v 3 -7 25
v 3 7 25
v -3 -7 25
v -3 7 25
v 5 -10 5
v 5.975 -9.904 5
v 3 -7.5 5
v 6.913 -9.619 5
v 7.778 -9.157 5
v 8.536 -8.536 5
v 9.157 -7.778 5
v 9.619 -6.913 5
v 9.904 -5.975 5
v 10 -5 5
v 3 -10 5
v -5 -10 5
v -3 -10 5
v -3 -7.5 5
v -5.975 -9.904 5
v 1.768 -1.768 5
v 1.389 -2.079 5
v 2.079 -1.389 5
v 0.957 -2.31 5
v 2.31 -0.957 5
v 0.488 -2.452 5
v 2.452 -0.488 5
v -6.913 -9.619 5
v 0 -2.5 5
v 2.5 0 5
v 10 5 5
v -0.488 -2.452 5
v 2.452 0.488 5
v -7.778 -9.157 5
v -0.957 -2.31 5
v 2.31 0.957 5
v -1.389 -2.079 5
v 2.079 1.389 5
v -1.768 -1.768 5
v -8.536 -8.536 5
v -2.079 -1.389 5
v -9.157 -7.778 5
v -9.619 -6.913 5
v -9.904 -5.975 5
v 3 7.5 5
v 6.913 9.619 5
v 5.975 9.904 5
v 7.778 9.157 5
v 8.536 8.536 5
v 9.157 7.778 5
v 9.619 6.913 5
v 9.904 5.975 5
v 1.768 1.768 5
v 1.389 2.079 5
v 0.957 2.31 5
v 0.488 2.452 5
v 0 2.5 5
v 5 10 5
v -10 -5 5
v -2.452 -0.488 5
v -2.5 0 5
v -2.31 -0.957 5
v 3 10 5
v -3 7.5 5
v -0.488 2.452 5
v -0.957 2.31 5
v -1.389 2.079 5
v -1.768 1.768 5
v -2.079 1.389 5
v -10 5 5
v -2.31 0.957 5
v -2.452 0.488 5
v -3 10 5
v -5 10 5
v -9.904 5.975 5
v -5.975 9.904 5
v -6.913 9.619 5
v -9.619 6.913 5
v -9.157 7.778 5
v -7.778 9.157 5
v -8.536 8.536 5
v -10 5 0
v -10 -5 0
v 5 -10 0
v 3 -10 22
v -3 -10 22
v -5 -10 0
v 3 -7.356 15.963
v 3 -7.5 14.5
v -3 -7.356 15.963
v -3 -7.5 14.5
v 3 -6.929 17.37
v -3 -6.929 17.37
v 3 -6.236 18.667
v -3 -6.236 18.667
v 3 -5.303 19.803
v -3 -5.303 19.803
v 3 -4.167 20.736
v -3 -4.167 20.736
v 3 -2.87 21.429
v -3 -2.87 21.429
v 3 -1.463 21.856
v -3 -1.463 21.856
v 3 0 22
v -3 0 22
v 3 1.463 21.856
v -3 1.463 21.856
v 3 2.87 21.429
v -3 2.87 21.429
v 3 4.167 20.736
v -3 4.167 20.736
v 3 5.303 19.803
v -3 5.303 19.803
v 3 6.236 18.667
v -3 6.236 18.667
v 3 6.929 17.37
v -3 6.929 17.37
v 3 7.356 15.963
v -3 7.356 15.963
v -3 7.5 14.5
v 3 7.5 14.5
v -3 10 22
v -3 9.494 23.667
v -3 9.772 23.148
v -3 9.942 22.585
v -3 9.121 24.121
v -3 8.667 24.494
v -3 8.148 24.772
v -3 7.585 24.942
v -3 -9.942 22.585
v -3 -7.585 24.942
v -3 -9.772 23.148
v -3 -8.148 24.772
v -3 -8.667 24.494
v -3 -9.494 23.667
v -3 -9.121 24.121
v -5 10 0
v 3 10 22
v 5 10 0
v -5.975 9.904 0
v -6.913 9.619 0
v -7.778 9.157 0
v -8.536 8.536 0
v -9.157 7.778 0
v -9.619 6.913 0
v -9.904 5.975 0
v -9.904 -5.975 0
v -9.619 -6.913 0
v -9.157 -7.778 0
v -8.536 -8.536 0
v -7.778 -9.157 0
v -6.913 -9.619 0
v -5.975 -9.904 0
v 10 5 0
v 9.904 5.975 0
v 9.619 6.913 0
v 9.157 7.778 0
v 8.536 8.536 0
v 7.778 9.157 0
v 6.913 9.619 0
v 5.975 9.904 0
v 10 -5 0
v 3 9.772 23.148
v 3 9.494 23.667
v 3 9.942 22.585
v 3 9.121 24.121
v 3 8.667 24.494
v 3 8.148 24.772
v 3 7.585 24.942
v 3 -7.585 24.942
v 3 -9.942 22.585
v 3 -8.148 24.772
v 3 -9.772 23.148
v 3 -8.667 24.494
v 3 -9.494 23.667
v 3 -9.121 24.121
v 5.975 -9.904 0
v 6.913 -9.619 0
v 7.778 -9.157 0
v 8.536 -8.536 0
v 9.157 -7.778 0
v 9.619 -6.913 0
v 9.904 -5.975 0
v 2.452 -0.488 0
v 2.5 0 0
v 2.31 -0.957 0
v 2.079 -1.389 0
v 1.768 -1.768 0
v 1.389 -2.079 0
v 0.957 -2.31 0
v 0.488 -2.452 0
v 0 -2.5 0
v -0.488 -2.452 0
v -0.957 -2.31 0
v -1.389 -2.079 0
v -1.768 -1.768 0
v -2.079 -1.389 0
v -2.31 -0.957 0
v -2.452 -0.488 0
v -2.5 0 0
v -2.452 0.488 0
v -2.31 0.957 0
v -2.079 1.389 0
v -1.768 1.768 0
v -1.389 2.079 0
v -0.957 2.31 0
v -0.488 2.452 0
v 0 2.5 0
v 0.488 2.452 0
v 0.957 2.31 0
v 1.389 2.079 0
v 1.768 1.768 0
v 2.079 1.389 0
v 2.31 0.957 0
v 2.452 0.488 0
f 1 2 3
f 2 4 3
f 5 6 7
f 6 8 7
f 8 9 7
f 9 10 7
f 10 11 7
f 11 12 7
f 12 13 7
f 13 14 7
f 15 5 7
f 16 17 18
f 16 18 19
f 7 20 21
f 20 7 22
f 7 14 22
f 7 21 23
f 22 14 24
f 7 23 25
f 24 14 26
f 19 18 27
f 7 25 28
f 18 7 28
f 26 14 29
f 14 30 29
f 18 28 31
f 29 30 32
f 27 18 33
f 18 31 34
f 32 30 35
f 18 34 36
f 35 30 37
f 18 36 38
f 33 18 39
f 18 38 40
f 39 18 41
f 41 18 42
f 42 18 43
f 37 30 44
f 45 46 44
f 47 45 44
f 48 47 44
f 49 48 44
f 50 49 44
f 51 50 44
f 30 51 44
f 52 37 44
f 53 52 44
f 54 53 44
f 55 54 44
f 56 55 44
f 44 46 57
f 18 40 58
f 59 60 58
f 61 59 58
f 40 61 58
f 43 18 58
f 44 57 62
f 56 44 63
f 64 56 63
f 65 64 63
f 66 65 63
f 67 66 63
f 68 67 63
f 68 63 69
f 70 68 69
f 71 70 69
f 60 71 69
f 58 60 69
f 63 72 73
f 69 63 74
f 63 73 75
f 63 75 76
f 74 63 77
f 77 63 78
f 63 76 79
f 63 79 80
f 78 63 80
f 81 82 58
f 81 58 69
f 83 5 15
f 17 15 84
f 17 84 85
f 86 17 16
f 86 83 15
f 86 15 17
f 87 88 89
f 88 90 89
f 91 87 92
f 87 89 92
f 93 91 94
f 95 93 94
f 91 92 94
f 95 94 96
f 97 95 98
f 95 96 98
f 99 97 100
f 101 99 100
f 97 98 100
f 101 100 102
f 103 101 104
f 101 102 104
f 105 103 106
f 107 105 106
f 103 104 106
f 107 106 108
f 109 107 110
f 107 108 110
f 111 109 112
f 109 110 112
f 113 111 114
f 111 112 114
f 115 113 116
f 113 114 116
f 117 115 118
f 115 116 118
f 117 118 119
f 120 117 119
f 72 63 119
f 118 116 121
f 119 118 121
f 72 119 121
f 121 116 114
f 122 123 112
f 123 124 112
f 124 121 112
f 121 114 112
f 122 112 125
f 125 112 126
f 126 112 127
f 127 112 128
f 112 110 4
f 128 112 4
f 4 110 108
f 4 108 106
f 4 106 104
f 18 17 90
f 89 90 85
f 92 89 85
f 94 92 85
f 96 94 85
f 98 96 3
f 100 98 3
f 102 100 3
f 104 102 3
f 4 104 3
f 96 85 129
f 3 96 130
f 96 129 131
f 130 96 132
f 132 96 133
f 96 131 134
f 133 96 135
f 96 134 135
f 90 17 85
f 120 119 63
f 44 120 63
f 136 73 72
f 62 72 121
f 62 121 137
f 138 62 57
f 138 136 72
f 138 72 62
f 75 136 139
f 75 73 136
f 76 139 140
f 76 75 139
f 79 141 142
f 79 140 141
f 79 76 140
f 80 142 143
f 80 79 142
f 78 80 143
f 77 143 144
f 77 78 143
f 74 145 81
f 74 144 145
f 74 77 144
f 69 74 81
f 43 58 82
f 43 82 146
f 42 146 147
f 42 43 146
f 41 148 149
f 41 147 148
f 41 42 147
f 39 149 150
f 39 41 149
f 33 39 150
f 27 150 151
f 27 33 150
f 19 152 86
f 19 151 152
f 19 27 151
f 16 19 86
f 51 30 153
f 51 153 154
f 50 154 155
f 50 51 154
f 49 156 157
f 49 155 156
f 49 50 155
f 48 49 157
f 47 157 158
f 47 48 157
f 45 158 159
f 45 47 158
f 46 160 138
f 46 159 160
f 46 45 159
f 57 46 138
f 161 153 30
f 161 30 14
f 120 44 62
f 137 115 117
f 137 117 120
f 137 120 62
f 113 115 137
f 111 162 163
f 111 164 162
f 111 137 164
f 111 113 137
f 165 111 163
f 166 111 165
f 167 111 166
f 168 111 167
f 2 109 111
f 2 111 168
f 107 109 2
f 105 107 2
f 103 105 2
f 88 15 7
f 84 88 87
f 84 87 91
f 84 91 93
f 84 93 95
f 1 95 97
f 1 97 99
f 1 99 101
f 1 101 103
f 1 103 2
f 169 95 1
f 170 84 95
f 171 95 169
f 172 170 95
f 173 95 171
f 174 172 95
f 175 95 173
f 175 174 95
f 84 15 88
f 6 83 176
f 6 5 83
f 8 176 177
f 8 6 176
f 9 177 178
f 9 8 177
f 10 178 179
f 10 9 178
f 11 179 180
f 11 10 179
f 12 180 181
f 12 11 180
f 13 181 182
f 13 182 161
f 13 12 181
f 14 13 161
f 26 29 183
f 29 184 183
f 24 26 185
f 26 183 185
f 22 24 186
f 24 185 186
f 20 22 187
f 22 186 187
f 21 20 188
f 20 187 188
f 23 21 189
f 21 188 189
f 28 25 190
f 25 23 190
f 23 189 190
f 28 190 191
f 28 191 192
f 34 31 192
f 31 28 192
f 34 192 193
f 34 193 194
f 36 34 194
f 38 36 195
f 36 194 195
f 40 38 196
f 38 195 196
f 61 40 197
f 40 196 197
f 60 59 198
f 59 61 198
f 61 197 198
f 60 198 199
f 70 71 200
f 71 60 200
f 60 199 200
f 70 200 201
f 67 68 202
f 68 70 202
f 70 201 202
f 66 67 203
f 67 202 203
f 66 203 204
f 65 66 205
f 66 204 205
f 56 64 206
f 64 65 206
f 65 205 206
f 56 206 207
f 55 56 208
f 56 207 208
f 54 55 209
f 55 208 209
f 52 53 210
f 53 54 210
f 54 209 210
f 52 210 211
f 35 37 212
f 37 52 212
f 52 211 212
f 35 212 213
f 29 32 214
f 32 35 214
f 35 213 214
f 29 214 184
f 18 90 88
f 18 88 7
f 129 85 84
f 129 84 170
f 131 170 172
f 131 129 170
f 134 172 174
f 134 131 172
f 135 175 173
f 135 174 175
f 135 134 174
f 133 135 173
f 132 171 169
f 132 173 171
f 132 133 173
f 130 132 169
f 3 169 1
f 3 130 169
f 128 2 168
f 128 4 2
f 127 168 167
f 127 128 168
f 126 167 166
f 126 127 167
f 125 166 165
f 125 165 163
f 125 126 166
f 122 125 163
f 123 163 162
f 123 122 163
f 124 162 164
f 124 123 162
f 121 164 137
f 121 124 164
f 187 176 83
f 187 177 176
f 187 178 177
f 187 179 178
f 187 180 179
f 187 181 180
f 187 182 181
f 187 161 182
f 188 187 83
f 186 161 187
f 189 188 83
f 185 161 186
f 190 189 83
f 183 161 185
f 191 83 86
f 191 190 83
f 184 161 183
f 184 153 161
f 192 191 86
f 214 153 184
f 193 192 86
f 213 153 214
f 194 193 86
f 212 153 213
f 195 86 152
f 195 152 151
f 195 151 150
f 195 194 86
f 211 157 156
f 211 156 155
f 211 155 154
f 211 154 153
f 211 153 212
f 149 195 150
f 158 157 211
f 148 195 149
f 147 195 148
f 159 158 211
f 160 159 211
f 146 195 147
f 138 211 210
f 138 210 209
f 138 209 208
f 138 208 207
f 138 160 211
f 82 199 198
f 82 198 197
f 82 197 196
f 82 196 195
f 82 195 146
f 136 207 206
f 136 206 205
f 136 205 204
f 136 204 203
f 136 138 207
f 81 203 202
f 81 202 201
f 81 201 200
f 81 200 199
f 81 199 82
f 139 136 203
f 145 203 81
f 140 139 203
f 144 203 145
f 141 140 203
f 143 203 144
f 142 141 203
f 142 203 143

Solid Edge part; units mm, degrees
sketch "Sketch1" plane through (0, 0, 0) normal (0, 0, 1) x (1, 0, 0)
  line L0 (10, -10) -> (-10, -10)
  line L1 (-10, -10) -> (-10, 10)
  line L2 (-10, 10) -> (10, 10)
  line L3 (10, 10) -> (10, -10)
  circle A0 centre (0, 0) radius 2.5
extrude "Protrusion1" add sketch "Sketch1" along normal blind 5
fillet "Round_1" radius 5 4 edges at (10, -10, 2.5) (10, 10, 2.5) (-10, 10, 2.5) (-10, -10, 2.5)
sketch "Sketch2" plane through (0, 0, 0) normal (1, 0, 0) x (0, 1, 0)
  line L0 (-10, 5) -> (-7.5, 5)
  line L1 (-7.5, 14.5) -> (-7.5, 5)
  line L2 (7.5, 14.5) -> (7.5, 5)
  line L3 (7.5, 5) -> (10, 5)
  line L4 (10, 5) -> (10, 22)
  arc A0 (7, 25) -> (10, 22) centre (7, 22) cw
  line L5 (7, 25) -> (-7, 25)
  arc A1 (-7, 25) -> (-10, 22) centre (-7, 22) ccw
  line L6 (-10, 22) -> (-10, 5)
  arc A2 (-7.5, 14.5) -> (7.5, 14.5) centre (0, 14.5) cw
extrude "ExtrudedProtrusion_2" add sketch "Sketch2" along normal mid plane 6
